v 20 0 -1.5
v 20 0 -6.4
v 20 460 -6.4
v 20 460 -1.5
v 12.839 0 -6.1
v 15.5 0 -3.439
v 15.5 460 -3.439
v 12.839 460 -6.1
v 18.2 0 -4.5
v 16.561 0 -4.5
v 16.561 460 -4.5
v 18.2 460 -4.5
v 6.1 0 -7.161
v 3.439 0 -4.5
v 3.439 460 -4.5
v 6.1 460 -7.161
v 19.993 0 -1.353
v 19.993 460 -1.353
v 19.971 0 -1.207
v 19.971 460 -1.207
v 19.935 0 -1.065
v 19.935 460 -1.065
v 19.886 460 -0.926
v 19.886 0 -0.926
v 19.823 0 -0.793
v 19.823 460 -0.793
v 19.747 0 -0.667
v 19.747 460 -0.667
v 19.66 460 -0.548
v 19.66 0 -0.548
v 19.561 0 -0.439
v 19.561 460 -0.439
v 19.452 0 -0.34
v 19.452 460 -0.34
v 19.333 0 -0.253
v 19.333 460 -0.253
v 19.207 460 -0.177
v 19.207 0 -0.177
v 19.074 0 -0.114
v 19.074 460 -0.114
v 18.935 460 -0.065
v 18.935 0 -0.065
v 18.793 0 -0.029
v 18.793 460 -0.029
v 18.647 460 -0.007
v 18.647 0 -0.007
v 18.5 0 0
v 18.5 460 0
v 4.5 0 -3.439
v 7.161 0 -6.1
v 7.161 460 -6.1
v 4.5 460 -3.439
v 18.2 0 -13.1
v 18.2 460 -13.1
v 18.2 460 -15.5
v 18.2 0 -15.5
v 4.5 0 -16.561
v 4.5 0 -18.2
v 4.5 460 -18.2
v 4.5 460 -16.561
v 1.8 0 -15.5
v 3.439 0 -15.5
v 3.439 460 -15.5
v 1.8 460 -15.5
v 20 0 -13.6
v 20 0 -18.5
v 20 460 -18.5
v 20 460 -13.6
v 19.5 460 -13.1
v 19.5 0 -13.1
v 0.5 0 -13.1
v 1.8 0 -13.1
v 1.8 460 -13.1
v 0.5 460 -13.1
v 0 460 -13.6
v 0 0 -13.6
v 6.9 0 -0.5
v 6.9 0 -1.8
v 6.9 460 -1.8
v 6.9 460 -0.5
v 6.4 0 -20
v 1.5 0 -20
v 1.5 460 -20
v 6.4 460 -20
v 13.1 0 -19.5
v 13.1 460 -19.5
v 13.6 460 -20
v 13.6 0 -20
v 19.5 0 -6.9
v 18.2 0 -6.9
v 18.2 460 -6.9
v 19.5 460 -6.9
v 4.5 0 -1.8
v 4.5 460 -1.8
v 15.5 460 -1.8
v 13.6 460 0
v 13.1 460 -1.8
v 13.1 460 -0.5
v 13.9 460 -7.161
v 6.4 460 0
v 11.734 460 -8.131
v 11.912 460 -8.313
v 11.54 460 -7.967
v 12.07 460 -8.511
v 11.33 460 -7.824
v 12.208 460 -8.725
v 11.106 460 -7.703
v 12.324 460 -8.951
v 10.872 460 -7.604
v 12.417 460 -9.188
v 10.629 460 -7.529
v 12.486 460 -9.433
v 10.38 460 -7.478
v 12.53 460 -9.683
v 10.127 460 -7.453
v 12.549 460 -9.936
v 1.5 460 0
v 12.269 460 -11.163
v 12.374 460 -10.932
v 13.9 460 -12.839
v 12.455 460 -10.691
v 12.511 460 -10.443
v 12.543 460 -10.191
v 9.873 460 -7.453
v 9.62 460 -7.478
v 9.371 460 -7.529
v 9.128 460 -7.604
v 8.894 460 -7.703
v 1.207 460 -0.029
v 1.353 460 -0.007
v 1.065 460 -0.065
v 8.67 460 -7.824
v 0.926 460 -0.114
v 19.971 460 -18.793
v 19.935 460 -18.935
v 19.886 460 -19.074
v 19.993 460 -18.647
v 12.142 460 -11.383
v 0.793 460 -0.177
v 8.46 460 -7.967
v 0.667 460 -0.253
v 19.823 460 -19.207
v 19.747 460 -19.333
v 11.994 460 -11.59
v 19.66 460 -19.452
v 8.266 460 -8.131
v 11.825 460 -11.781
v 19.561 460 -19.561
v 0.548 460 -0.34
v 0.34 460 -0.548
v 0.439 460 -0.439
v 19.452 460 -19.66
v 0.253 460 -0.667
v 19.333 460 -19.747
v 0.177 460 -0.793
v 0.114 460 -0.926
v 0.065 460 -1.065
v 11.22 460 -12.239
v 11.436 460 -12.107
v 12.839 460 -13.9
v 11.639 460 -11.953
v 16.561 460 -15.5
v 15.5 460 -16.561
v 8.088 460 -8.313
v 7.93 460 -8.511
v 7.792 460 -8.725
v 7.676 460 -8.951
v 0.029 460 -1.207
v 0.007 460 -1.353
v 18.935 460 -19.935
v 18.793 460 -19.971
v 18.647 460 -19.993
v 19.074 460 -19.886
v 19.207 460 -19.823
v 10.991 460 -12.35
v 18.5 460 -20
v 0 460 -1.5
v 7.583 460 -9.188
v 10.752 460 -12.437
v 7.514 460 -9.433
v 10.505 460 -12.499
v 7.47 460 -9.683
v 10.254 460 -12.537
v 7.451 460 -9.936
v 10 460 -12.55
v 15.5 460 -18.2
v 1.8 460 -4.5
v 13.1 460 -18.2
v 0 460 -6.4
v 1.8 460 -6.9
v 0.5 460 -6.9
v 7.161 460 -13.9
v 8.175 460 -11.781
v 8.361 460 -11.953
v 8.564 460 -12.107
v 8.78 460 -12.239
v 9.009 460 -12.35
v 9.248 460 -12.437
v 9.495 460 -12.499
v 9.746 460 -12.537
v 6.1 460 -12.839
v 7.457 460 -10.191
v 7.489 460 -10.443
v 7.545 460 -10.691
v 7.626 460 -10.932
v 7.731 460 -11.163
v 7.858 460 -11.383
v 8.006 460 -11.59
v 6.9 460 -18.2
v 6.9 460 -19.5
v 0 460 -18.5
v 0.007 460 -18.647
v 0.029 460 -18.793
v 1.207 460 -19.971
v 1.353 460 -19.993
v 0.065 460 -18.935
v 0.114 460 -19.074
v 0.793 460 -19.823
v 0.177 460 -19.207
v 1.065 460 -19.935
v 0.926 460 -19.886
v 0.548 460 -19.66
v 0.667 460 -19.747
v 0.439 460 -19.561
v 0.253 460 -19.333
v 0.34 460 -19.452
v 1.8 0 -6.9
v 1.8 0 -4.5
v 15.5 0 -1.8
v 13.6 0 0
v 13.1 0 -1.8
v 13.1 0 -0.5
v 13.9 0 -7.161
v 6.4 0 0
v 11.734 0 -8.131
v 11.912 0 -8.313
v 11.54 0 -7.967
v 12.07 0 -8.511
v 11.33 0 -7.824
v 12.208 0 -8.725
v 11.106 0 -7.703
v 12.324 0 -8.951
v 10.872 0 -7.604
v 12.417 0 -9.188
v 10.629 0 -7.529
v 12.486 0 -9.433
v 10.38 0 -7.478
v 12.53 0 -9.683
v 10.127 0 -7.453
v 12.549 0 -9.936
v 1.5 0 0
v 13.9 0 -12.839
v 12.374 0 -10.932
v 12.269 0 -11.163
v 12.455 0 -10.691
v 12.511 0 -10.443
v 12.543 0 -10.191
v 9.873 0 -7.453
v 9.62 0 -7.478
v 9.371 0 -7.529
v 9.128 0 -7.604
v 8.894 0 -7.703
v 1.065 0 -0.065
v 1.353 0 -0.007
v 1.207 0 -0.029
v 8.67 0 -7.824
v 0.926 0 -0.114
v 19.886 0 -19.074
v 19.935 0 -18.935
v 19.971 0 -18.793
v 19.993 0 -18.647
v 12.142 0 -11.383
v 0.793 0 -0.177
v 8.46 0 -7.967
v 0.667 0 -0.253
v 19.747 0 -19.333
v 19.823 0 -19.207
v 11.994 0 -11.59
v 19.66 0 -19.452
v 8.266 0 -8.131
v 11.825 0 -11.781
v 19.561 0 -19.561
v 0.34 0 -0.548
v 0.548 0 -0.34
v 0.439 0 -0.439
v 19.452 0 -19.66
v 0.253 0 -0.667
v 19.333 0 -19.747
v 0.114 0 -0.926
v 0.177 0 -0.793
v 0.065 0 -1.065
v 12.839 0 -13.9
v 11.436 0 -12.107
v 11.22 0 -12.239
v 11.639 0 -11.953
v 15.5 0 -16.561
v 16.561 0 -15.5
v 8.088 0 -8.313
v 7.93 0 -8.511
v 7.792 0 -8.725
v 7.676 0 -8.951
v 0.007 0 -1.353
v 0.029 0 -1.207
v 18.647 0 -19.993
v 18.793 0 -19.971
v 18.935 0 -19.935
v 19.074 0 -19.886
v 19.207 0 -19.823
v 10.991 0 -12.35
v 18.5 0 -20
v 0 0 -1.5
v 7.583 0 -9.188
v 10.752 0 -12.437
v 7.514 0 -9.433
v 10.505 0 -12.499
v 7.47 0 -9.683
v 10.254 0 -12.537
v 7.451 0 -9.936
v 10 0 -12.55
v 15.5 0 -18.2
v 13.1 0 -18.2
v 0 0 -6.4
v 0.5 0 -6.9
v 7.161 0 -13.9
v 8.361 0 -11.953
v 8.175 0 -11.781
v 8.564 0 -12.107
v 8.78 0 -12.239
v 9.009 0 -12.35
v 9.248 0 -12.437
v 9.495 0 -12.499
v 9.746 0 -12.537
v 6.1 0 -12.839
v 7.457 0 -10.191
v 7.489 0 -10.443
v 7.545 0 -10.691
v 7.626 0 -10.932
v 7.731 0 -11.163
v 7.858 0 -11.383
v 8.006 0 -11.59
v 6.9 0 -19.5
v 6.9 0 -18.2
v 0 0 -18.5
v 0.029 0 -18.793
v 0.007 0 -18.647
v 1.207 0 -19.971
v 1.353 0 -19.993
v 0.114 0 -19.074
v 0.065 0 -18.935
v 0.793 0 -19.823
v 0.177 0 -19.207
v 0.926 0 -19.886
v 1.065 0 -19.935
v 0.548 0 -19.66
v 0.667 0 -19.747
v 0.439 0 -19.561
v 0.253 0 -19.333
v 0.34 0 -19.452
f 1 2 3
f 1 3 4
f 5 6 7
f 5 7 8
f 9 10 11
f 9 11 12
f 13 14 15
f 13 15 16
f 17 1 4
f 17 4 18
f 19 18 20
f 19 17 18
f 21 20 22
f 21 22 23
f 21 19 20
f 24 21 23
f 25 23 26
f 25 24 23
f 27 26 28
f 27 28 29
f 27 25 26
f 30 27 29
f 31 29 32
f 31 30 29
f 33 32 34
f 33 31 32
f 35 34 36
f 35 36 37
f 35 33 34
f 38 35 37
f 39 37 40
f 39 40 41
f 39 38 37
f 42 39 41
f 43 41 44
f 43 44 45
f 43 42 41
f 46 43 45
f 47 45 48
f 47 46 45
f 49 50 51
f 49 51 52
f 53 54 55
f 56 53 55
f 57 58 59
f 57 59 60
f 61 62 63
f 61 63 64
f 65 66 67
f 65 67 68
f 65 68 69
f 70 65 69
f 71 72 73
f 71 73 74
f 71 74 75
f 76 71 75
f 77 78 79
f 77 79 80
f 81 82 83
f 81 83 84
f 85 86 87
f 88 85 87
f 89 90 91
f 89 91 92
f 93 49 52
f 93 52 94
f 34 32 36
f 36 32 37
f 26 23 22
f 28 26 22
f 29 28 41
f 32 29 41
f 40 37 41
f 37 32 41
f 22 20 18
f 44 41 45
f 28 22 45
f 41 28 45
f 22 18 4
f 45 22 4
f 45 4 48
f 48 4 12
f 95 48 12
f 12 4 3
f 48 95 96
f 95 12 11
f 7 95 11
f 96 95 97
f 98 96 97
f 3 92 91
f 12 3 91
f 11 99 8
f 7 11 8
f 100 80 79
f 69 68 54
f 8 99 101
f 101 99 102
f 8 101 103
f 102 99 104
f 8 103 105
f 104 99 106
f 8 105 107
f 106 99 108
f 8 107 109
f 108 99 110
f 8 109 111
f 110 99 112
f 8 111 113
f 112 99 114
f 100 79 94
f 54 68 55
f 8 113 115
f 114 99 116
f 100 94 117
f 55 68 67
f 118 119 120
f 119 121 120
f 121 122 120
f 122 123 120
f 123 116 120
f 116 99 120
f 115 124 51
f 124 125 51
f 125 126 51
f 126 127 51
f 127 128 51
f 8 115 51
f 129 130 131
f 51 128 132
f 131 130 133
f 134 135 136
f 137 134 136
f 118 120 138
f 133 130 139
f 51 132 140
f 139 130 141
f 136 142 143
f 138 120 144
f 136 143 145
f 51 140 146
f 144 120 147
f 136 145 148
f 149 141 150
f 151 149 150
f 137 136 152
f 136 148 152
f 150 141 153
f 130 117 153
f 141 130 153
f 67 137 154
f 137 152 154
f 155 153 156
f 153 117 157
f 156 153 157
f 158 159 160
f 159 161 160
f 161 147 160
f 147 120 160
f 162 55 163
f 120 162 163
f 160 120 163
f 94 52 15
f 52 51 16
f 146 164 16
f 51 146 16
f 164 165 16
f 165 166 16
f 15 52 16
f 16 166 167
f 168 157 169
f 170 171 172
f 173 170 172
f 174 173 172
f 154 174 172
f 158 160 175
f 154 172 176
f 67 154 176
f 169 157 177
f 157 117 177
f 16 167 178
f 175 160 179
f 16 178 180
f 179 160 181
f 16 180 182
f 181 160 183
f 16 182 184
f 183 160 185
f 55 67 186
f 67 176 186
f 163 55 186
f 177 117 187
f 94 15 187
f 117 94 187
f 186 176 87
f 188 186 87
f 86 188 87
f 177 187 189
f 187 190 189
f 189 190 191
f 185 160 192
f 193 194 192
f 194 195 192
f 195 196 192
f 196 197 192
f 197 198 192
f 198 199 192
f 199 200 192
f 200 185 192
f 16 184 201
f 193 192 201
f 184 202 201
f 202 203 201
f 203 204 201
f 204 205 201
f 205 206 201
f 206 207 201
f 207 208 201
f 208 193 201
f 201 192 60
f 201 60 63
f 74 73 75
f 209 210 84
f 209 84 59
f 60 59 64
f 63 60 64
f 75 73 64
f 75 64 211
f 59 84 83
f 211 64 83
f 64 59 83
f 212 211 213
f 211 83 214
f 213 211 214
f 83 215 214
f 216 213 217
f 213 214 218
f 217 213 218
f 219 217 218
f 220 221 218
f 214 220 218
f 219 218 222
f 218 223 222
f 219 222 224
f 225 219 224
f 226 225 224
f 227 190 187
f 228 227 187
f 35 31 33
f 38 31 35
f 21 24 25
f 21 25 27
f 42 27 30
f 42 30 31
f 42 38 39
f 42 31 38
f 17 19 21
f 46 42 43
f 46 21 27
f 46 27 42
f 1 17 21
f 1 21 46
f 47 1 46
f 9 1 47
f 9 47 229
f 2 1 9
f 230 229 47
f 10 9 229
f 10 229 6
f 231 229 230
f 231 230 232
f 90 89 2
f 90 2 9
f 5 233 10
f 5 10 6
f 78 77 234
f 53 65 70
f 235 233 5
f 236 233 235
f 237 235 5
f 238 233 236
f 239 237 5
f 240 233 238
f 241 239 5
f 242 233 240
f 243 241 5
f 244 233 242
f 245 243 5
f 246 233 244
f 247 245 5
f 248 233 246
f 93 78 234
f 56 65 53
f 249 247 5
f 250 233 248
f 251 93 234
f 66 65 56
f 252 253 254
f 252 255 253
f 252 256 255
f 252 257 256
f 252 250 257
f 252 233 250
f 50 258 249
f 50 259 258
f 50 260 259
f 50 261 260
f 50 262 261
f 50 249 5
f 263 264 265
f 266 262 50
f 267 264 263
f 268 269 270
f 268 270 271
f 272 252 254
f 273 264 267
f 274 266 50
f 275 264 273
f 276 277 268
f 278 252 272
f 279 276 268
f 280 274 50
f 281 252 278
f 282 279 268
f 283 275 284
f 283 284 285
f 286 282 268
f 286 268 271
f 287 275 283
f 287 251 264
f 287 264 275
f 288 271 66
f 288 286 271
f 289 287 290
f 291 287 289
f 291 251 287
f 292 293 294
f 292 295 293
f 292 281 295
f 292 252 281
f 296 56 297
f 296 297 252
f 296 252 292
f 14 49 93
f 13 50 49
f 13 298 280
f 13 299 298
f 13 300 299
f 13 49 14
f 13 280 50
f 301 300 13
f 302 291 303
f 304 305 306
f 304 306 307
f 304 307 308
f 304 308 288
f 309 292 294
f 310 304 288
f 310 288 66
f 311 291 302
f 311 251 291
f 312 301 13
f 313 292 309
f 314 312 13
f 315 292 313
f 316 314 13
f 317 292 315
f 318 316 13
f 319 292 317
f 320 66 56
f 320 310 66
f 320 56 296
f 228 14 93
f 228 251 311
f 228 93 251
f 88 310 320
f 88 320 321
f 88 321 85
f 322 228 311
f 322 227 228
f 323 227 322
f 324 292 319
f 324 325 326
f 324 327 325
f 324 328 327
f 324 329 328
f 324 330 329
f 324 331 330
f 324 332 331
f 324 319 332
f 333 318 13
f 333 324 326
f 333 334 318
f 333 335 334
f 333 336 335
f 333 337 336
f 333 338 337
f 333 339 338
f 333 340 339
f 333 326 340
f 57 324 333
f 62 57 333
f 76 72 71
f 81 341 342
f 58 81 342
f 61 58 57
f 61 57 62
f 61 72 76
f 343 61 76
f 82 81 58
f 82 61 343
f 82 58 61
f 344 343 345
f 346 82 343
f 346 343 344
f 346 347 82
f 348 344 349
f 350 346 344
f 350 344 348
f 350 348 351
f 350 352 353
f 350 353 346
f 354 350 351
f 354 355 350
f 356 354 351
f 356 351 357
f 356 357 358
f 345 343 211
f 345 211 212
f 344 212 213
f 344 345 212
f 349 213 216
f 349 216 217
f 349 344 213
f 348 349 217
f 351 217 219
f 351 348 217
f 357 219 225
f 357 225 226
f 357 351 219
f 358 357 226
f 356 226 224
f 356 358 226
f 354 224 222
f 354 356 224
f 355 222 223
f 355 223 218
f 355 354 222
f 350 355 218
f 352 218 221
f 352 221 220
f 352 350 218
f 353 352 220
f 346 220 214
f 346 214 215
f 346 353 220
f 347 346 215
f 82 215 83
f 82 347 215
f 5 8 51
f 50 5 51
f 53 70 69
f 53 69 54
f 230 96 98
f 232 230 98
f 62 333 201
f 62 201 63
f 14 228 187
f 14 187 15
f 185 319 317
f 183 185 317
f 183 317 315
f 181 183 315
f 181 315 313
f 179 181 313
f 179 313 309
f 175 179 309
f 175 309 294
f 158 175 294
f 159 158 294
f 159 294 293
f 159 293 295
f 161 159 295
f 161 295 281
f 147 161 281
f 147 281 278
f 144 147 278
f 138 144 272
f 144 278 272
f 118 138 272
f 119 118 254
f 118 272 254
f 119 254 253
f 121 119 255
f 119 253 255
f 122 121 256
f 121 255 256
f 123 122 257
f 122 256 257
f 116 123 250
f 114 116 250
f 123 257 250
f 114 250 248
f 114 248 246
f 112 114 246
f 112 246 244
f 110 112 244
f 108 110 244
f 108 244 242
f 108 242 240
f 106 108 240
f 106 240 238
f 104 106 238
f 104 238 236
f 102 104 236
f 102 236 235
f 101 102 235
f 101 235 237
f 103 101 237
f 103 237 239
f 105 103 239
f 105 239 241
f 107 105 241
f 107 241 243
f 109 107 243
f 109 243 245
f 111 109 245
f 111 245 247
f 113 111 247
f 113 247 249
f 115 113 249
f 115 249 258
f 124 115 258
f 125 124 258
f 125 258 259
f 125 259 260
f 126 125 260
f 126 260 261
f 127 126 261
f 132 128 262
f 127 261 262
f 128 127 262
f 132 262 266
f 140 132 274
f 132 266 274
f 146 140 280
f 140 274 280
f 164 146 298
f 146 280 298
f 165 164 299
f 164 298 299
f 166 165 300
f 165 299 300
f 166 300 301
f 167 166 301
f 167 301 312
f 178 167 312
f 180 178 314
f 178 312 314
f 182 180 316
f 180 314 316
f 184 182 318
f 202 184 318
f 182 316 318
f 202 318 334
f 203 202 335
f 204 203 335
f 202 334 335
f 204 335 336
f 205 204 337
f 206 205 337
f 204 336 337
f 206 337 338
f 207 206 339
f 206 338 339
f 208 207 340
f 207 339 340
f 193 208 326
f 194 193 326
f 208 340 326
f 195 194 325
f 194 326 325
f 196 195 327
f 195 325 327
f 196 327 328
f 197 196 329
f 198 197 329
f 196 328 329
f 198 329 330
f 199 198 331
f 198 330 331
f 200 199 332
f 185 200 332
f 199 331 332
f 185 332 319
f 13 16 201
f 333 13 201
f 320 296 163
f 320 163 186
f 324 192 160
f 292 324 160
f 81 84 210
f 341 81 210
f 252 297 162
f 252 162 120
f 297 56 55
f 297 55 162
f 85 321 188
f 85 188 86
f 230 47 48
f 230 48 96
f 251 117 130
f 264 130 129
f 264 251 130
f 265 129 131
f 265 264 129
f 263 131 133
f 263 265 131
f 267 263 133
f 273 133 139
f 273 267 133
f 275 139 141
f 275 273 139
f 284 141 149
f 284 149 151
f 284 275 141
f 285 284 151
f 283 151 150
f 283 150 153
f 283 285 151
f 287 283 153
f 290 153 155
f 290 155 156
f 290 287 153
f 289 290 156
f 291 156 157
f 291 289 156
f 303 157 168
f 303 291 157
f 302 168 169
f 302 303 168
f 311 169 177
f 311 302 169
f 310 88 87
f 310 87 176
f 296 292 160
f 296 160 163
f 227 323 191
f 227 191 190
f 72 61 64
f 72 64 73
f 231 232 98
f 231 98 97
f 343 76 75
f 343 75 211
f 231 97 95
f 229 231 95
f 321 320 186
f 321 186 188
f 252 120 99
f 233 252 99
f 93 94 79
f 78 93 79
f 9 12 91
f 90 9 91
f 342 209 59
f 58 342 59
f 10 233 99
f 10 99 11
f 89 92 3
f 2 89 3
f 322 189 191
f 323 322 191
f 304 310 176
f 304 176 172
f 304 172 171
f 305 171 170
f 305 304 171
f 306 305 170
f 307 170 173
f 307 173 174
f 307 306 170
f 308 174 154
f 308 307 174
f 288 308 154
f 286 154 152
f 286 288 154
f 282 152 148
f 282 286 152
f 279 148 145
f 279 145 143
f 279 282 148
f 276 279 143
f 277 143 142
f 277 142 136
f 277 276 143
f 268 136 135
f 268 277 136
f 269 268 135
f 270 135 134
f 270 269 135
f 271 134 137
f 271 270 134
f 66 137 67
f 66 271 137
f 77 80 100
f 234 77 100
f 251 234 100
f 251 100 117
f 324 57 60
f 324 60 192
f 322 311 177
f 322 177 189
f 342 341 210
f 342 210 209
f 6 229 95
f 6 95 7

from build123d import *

# Parameters (mm, degrees)
EXTRUDE_2_DEPTH     = 460
SKETCH_4_R          = 2.55
CUT_EXTRUDE_2_DEPTH = 461.868744872


with BuildPart() as part:
    # 草图1 → 凸台-拉伸2 (new body)
    with BuildSketch(Plane(origin=(0, 0, 0), x_dir=(1, 0, 0), z_dir=(0, 1, 0))):
        with BuildLine():
            Line((13.9, 12.839339828), (13.9, 7.160660172))
            Line((13.9, 7.160660172), (16.560660172, 4.5))
            Line((16.560660172, 4.5), (18.2, 4.5))
            Line((18.2, 4.5), (18.2, 6.9))
            Line((18.2, 6.9), (19.5, 6.9))
            Line((19.5, 6.9), (20, 6.4))
            Line((20, 6.4), (20, 1.5))
            ThreePointArc((20, 1.5), (19.560660172, 0.439339828), (18.5, 0))
            Line((18.5, 0), (13.6, 0))
            Line((13.6, 0), (13.1, 0.5))
            Line((13.1, 0.5), (13.1, 1.8))
            Line((13.1, 1.8), (15.5, 1.8))
            Line((15.5, 1.8), (15.5, 3.439339828))
            Line((15.5, 3.439339828), (12.839339828, 6.1))
            Line((12.839339828, 6.1), (7.160660172, 6.1))
            Line((7.160660172, 6.1), (4.5, 3.439339828))
            Line((4.5, 3.439339828), (4.5, 1.8))
            Line((4.5, 1.8), (6.9, 1.8))
            Line((6.9, 1.8), (6.9, 0.5))
            Line((6.9, 0.5), (6.4, 0))
            Line((6.4, 0), (1.5, 0))
            ThreePointArc((1.5, 0), (0.439339828, 0.439339828), (0, 1.5))
            Line((0, 1.5), (0, 6.4))
            Line((0, 6.4), (0.5, 6.9))
            Line((0.5, 6.9), (1.8, 6.9))
            Line((1.8, 6.9), (1.8, 4.5))
            Line((1.8, 4.5), (3.439339828, 4.5))
            Line((3.439339828, 4.5), (6.1, 7.160660172))
            Line((6.1, 7.160660172), (6.1, 12.839339828))
            Line((6.1, 12.839339828), (3.439339828, 15.5))
            Line((3.439339828, 15.5), (1.8, 15.5))
            Line((1.8, 15.5), (1.8, 13.1))
            Line((1.8, 13.1), (0.5, 13.1))
            Line((0.5, 13.1), (0, 13.6))
            Line((0, 13.6), (0, 18.5))
            ThreePointArc((0, 18.5), (0.439339828, 19.560660172), (1.5, 20))
            Line((1.5, 20), (6.4, 20))
            Line((6.4, 20), (6.9, 19.5))
            Line((6.9, 19.5), (6.9, 18.2))
            Line((6.9, 18.2), (4.5, 18.2))
            Line((4.5, 18.2), (4.5, 16.560660172))
            Line((4.5, 16.560660172), (7.160660172, 13.9))
            Line((7.160660172, 13.9), (12.839339828, 13.9))
            Line((12.839339828, 13.9), (15.5, 16.560660172))
            Line((15.5, 16.560660172), (15.5, 18.2))
            Line((15.5, 18.2), (13.1, 18.2))
            Line((13.1, 18.2), (13.1, 19.5))
            Line((13.1, 19.5), (13.6, 20))
            Line((13.6, 20), (18.5, 20))
            ThreePointArc((18.5, 20), (19.560660172, 19.560660172), (20, 18.5))
            Line((20, 18.5), (20, 13.6))
            Line((20, 13.6), (19.5, 13.1))
            Line((19.5, 13.1), (18.2, 13.1))
            Line((18.2, 13.1), (18.2, 15.5))
            Line((18.2, 15.5), (16.560660172, 15.5))
            Line((16.560660172, 15.5), (13.9, 12.839339828))
        make_face()
    extrude(amount=EXTRUDE_2_DEPTH)

    # 草图4 → 切除-拉伸2 (cut, through all)
    with BuildSketch(Plane.XZ):
        with Locations(Location((10, -10, 0), (0, 0, 270))):
            Circle(SKETCH_4_R)
    extrude(amount=-CUT_EXTRUDE_2_DEPTH, mode=Mode.SUBTRACT)


solid = part.part
